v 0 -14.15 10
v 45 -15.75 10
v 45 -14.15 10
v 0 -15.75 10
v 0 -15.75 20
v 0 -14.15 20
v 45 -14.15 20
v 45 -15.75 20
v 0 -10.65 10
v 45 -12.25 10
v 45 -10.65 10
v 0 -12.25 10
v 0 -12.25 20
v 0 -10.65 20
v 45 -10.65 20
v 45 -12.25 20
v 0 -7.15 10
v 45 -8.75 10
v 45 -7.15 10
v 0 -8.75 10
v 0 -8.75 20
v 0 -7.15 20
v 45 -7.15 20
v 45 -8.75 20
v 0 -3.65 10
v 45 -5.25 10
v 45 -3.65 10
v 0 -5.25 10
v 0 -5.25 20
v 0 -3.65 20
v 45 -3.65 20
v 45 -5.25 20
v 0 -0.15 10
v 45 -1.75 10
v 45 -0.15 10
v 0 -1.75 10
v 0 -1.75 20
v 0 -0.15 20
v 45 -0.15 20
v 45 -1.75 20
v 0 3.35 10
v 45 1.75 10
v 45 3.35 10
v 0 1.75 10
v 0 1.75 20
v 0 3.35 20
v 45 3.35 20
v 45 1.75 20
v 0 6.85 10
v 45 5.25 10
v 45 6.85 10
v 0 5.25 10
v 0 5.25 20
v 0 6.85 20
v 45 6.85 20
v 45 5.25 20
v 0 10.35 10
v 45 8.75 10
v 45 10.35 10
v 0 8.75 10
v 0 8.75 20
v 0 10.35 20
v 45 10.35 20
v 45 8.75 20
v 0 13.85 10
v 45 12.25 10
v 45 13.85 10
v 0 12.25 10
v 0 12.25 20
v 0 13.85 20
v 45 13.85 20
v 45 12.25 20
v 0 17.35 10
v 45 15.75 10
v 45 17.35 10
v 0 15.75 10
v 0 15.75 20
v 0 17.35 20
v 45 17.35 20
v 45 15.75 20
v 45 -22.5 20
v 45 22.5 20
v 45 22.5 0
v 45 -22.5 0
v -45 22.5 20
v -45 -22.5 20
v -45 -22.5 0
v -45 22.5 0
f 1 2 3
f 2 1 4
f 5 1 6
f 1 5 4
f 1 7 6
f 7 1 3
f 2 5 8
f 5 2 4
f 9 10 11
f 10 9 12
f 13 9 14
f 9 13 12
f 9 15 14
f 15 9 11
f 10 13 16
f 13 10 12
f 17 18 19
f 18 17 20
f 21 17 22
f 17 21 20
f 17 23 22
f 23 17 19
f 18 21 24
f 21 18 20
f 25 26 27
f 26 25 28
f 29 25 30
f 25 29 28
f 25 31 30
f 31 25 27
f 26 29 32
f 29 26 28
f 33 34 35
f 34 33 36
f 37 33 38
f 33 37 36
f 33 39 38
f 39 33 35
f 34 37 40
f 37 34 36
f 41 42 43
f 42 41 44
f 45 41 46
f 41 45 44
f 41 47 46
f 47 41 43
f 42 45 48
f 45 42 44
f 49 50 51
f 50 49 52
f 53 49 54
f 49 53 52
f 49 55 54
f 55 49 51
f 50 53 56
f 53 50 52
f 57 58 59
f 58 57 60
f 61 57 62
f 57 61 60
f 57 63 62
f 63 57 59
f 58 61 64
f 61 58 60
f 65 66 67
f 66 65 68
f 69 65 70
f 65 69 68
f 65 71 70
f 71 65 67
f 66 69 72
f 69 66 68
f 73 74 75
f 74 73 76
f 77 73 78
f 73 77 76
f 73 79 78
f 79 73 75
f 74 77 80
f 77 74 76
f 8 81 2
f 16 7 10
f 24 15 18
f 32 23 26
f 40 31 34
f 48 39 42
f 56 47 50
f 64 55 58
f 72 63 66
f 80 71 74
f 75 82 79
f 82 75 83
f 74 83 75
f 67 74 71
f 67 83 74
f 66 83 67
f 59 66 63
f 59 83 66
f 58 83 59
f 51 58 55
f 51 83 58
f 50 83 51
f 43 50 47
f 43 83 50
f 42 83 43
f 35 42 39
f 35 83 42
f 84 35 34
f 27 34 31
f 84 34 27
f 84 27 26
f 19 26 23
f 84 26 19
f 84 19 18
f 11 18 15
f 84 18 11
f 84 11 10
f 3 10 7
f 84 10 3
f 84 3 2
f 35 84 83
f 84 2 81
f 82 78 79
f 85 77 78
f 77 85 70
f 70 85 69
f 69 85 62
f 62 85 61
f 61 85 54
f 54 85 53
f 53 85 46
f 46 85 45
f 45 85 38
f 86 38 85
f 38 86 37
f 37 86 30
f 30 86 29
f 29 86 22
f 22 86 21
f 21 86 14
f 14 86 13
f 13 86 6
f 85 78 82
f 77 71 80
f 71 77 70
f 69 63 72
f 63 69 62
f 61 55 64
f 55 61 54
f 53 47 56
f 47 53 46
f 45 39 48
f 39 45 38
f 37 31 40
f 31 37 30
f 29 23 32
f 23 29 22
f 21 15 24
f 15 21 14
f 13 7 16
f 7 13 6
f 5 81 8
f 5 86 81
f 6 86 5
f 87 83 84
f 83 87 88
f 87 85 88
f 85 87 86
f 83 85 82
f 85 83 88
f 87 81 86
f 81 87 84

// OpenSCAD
// Microscope slide drying rack
// Print orientation: base block on XY plane, slots open upward (+Z)

// ---------------- Parameters ----------------
block_len    = 90;    // block length along X (mm)
block_wid    = 45;    // block width along Y (mm)
block_h      = 20;    // block height along Z (mm)

slot_count   = 10;    // number of slide slots
slot_len     = 77;    // slot length along X (mm)
slot_w       = 1.6;   // slot width along Y (mm)
slot_depth   = 10;    // slot depth from top face (mm)
slot_pitch   = 3.5;   // centre-to-centre slot spacing along Y (mm)

eps          = 0.5;   // overcut so cutters pass beyond faces

$fn = 64;

// ---------------- Derived ----------------
first_y = -(slot_count - 1) * slot_pitch / 2;   // Y of first slot (group centred)

// ---------------- Model ----------------
difference() {
    // Solid base block
    translate([-block_len / 2, -block_wid / 2, 0])
        cube([block_len, block_wid, block_h]);

    // Parallel slots running along X, open at the top
    for (i = [0 : slot_count - 1]) {
        translate([0, first_y + i * slot_pitch, block_h - slot_depth])
            cube([slot_len, slot_w, slot_depth + eps]);
    }
}
